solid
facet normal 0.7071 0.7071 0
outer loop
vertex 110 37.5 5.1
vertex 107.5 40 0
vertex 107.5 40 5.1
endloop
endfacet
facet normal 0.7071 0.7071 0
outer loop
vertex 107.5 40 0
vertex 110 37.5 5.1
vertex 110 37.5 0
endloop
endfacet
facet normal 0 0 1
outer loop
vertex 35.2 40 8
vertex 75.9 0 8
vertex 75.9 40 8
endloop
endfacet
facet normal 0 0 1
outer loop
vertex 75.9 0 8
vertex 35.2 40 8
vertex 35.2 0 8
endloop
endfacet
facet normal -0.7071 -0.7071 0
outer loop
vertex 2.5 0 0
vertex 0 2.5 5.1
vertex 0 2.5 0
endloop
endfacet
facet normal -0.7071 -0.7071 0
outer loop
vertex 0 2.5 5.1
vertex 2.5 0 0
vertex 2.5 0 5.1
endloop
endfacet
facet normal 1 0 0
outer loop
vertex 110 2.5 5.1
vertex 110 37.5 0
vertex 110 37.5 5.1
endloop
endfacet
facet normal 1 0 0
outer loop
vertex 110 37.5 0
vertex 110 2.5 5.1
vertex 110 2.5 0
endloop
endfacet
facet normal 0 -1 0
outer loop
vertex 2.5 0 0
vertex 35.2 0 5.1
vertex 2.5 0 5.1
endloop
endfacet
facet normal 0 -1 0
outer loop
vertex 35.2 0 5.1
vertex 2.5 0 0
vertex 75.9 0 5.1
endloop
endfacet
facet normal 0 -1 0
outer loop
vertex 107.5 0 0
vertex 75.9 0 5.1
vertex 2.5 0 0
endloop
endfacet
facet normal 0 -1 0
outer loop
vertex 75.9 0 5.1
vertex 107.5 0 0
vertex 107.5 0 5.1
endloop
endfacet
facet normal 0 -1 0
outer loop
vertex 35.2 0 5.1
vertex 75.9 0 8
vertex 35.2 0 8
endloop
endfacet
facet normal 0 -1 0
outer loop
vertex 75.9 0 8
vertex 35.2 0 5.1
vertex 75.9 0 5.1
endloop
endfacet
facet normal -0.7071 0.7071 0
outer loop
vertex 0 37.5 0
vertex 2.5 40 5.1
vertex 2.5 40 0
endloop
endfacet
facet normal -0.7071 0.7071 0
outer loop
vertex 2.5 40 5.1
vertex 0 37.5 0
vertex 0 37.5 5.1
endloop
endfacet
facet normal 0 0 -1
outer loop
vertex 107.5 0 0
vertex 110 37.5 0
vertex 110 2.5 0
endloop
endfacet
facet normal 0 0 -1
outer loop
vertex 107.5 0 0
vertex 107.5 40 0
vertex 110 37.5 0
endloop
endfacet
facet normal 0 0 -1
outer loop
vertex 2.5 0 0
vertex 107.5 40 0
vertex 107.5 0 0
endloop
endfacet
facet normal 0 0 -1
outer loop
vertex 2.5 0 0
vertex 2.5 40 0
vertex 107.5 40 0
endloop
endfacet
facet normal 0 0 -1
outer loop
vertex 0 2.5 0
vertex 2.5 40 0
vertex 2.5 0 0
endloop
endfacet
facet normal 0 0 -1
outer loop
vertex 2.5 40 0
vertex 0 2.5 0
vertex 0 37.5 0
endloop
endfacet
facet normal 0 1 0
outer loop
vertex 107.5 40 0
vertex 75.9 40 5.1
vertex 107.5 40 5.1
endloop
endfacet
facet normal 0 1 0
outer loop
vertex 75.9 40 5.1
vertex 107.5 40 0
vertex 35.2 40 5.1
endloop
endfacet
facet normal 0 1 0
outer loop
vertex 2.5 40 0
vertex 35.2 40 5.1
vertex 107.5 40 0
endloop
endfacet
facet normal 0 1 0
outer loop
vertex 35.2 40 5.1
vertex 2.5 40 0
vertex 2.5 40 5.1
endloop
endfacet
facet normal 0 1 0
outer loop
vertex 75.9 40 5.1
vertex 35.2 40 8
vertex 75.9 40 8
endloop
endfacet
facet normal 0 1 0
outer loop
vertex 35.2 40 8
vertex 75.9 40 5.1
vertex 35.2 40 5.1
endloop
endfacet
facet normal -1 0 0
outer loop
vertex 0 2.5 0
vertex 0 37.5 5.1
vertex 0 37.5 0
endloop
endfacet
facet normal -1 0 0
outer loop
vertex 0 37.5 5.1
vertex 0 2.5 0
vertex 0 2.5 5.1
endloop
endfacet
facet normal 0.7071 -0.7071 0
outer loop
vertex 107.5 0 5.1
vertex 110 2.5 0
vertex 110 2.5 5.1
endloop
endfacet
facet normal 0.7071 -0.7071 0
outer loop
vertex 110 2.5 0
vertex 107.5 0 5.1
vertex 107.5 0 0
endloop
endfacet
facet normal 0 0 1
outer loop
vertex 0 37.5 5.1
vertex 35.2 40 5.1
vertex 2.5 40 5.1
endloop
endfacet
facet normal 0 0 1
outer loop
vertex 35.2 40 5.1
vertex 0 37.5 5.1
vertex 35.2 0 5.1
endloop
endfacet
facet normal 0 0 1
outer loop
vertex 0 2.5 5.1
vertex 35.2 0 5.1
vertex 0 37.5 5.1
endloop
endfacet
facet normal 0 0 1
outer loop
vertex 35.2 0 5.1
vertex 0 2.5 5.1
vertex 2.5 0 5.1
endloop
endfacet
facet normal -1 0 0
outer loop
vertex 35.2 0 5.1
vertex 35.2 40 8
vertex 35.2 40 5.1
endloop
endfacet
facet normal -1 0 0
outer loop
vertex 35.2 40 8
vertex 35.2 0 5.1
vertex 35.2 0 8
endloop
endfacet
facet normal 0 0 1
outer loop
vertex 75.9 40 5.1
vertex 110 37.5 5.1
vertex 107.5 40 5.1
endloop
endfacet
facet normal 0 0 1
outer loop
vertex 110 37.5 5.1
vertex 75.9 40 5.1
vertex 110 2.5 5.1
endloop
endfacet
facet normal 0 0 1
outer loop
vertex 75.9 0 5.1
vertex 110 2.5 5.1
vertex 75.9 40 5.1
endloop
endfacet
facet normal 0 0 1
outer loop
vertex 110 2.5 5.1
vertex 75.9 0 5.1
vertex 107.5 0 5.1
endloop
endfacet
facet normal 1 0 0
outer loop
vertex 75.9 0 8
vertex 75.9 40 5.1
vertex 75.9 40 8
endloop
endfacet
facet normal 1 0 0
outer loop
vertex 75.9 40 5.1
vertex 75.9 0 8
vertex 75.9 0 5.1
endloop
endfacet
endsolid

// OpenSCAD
$fn = 32;

// ----------------------------------------------------------------------
// Stepped bar: centerstep, 110 x 40 x 8/5.1 mm
// ----------------------------------------------------------------------

// --- parameters (mm) ---
bar_l = 110;              // bar length, X
bar_w = 40;               // bar width, Y
plate_t = 8;              // thickness of the thick zone, Z
thin_t = 5.1;             // thickness of the thin zone
corner_c = 2.5;           // corner chamfer of the bar
step_cut = 2.9;           // material removed from the thin zone
thick_from = 35.2;        // start of the thick middle zone
thick_to = 75.9;          // end of the thick middle zone
depth_1 = 2.9;            // depth of cut 1 from the top face
depth_2 = 2.9;            // depth of cut 2 from the top face

profile = [[2.5, 0], [107.5, 0], [110, 2.5], [110, 37.5], [107.5, 40], [2.5, 40], [0, 37.5], [0, 2.5]];  // primary outline, 8 points, counter clockwise
void_1 = [[-1, -1], [35.2, -1], [35.2, 41], [-1, 41]];  // thin left end, 4 points
void_2 = [[75.9, -1], [111, -1], [111, 41], [75.9, 41]];  // thin right end, 4 points

// --- the one profile operation ---
difference() {
  linear_extrude(height = plate_t) polygon(points = profile);
  translate([0, 0, plate_t - depth_1])
    linear_extrude(height = depth_1 + 1) polygon(points = void_1);
  translate([0, 0, plate_t - depth_2])
    linear_extrude(height = depth_2 + 1) polygon(points = void_2);
}
